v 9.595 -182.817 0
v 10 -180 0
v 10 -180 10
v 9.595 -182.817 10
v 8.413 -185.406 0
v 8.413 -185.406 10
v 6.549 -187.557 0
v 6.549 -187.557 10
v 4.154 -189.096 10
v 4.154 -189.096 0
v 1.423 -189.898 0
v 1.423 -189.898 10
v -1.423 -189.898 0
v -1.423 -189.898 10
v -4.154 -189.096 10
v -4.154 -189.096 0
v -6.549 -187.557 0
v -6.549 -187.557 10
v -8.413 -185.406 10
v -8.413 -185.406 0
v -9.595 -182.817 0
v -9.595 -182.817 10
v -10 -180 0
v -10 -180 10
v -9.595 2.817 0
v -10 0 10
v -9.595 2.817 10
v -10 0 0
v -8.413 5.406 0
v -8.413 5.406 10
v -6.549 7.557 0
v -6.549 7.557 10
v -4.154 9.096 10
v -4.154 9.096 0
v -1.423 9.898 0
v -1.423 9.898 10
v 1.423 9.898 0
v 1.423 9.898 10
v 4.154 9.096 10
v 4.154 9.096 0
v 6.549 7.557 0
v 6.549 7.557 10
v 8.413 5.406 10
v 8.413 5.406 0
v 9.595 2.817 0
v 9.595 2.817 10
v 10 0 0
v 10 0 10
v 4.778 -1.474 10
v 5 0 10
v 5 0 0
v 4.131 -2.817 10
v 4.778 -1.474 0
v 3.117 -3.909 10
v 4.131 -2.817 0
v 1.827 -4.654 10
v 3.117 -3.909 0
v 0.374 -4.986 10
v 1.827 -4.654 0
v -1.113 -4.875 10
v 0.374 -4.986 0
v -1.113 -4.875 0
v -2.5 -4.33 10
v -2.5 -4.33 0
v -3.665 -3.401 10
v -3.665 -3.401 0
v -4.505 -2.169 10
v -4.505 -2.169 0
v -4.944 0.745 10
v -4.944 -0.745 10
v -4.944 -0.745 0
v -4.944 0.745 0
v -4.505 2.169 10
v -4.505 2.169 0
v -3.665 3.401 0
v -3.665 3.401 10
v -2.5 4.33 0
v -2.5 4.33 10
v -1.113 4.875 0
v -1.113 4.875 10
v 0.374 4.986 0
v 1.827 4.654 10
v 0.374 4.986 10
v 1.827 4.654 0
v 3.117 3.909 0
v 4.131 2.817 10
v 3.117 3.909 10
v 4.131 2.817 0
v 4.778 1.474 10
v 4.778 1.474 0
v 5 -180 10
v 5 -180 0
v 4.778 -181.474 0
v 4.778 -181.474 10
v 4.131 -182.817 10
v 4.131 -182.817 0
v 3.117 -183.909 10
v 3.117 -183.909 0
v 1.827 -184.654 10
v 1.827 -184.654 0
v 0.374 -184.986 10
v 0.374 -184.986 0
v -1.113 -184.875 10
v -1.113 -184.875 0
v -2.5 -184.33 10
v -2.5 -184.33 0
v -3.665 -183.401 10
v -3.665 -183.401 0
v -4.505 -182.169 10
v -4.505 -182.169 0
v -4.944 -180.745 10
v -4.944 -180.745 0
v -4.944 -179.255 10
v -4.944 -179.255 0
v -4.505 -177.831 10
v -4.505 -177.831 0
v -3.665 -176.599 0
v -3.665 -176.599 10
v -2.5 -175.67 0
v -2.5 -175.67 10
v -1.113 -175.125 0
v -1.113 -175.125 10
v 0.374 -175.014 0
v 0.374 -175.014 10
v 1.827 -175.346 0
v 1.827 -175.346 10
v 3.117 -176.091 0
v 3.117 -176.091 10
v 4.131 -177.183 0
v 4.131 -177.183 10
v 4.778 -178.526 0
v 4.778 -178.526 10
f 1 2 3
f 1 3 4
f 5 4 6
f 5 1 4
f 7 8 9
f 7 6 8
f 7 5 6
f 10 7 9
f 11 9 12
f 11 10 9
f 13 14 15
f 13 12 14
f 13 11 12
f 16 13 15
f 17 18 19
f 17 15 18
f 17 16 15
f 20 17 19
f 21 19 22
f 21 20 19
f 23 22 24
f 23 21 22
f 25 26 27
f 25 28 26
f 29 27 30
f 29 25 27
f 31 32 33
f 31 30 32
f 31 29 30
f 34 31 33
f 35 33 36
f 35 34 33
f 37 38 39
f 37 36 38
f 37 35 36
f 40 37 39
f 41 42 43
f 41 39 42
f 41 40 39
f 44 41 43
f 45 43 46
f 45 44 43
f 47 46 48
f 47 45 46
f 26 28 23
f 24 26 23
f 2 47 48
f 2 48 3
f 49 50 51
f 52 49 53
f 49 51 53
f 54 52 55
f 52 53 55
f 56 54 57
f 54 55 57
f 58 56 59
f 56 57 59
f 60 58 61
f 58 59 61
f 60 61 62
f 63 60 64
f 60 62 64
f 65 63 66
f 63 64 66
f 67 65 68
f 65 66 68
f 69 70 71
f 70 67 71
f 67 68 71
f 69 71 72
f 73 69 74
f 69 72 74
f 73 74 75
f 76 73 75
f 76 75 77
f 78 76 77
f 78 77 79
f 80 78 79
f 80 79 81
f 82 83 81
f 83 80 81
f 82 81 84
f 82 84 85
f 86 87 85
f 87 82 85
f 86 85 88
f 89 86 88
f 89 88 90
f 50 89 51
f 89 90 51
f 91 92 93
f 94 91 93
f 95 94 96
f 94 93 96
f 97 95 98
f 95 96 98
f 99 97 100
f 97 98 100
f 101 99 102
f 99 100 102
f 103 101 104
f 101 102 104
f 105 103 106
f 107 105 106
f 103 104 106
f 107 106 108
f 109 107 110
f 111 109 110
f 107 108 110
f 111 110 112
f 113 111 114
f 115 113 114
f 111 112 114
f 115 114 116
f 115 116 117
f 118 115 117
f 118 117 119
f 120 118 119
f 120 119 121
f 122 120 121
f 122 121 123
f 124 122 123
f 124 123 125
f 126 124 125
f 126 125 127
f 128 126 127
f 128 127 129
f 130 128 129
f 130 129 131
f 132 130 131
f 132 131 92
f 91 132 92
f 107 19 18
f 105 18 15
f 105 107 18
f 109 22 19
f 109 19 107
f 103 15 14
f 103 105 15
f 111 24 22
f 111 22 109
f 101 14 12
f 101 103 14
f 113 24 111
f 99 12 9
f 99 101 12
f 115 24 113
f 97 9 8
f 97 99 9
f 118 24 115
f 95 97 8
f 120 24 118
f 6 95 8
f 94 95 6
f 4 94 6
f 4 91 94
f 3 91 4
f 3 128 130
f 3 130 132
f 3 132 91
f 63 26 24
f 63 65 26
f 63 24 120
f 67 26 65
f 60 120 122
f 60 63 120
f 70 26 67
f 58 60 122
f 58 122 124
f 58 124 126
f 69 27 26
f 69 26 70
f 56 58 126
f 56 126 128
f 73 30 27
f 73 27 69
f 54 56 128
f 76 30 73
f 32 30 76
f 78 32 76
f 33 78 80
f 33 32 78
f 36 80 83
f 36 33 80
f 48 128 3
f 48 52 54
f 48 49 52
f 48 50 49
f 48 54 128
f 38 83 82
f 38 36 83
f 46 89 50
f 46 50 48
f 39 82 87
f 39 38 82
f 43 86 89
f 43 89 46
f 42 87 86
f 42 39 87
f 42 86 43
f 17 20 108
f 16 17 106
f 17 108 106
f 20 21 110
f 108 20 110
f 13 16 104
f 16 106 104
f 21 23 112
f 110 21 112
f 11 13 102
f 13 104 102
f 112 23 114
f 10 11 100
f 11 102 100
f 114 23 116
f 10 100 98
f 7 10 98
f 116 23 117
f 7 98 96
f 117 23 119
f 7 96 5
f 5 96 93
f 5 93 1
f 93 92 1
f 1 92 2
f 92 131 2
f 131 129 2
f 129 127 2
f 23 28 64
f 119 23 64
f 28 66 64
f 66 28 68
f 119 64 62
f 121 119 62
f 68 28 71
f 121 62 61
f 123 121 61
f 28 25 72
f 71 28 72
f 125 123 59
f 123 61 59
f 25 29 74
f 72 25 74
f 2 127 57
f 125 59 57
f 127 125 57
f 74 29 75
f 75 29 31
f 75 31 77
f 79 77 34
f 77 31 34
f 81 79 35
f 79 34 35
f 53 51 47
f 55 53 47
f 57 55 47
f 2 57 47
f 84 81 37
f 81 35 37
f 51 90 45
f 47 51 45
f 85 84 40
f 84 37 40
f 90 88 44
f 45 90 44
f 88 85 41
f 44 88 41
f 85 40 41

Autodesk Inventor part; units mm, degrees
ref_plane "YZ Plane" through (0, 0, 0) normal (1, 0, 0) x (0, 1, 0)
ref_plane "XZ Plane" through (0, 0, 0) normal (0, 1, 0) x (-1, 0, 0)
ref_plane "XY Plane" through (0, 0, 0) normal (0, 0, 1) x (1, 0, 0)
sketch "スケッチ1" plane through (0, 0, 0) normal (0, 0, 1) x (1, 0, 0)
  circle A0 centre (0, 0) radius 5
  circle A1 centre (0, 0) radius 10
  line L0 (-5, 0) -> (5, 0)
  line L1 (5, 0) -> (5, -190)
  line L2 (5, -190) -> (-5, -190)
  line L3 (-5, -190) -> (-5, 0)
  line L4 (-10, 0) -> (-10, -190)
  line L5 (-10, -190) -> (5, -190)
  line L6 (10, 0) -> (10, -190)
  line L7 (10, -190) -> (5, -190)
  circle A2 centre (0, -180) radius 5
  circle A3 centre (0, -180) radius 10
  point P0 (5, -8.6603)
  point P1 (-5, -8.6603)
  point P2 (-5, -171.3397)
  point P3 (5, -171.3397)
  point P4 (-10, -180)
  point P5 (10, -180)
  dimension "d0" = 10
  dimension "d1" = 20
  dimension "d3" = 10
  dimension "d15" = 20
  dimension "d16" = 10
  dimension "d17" = 20
  dimension "d18" = 10
  dimension "d19" = 10
  dimension "d22" = 180
extrude "押し出し1" add sketch "スケッチ1" along normal blind 10 contours L1 A1 L3 A0 | A0 L3 A1 L1 | L1 A3 L3 A1 | A1 L6 A3 L1 | L3 A3 L4 A1 | A3 L1 | L1 A2 L3 A3 | L3 A3 | L1 A3 L3 A2
properties part number "legparts_03(six)"
